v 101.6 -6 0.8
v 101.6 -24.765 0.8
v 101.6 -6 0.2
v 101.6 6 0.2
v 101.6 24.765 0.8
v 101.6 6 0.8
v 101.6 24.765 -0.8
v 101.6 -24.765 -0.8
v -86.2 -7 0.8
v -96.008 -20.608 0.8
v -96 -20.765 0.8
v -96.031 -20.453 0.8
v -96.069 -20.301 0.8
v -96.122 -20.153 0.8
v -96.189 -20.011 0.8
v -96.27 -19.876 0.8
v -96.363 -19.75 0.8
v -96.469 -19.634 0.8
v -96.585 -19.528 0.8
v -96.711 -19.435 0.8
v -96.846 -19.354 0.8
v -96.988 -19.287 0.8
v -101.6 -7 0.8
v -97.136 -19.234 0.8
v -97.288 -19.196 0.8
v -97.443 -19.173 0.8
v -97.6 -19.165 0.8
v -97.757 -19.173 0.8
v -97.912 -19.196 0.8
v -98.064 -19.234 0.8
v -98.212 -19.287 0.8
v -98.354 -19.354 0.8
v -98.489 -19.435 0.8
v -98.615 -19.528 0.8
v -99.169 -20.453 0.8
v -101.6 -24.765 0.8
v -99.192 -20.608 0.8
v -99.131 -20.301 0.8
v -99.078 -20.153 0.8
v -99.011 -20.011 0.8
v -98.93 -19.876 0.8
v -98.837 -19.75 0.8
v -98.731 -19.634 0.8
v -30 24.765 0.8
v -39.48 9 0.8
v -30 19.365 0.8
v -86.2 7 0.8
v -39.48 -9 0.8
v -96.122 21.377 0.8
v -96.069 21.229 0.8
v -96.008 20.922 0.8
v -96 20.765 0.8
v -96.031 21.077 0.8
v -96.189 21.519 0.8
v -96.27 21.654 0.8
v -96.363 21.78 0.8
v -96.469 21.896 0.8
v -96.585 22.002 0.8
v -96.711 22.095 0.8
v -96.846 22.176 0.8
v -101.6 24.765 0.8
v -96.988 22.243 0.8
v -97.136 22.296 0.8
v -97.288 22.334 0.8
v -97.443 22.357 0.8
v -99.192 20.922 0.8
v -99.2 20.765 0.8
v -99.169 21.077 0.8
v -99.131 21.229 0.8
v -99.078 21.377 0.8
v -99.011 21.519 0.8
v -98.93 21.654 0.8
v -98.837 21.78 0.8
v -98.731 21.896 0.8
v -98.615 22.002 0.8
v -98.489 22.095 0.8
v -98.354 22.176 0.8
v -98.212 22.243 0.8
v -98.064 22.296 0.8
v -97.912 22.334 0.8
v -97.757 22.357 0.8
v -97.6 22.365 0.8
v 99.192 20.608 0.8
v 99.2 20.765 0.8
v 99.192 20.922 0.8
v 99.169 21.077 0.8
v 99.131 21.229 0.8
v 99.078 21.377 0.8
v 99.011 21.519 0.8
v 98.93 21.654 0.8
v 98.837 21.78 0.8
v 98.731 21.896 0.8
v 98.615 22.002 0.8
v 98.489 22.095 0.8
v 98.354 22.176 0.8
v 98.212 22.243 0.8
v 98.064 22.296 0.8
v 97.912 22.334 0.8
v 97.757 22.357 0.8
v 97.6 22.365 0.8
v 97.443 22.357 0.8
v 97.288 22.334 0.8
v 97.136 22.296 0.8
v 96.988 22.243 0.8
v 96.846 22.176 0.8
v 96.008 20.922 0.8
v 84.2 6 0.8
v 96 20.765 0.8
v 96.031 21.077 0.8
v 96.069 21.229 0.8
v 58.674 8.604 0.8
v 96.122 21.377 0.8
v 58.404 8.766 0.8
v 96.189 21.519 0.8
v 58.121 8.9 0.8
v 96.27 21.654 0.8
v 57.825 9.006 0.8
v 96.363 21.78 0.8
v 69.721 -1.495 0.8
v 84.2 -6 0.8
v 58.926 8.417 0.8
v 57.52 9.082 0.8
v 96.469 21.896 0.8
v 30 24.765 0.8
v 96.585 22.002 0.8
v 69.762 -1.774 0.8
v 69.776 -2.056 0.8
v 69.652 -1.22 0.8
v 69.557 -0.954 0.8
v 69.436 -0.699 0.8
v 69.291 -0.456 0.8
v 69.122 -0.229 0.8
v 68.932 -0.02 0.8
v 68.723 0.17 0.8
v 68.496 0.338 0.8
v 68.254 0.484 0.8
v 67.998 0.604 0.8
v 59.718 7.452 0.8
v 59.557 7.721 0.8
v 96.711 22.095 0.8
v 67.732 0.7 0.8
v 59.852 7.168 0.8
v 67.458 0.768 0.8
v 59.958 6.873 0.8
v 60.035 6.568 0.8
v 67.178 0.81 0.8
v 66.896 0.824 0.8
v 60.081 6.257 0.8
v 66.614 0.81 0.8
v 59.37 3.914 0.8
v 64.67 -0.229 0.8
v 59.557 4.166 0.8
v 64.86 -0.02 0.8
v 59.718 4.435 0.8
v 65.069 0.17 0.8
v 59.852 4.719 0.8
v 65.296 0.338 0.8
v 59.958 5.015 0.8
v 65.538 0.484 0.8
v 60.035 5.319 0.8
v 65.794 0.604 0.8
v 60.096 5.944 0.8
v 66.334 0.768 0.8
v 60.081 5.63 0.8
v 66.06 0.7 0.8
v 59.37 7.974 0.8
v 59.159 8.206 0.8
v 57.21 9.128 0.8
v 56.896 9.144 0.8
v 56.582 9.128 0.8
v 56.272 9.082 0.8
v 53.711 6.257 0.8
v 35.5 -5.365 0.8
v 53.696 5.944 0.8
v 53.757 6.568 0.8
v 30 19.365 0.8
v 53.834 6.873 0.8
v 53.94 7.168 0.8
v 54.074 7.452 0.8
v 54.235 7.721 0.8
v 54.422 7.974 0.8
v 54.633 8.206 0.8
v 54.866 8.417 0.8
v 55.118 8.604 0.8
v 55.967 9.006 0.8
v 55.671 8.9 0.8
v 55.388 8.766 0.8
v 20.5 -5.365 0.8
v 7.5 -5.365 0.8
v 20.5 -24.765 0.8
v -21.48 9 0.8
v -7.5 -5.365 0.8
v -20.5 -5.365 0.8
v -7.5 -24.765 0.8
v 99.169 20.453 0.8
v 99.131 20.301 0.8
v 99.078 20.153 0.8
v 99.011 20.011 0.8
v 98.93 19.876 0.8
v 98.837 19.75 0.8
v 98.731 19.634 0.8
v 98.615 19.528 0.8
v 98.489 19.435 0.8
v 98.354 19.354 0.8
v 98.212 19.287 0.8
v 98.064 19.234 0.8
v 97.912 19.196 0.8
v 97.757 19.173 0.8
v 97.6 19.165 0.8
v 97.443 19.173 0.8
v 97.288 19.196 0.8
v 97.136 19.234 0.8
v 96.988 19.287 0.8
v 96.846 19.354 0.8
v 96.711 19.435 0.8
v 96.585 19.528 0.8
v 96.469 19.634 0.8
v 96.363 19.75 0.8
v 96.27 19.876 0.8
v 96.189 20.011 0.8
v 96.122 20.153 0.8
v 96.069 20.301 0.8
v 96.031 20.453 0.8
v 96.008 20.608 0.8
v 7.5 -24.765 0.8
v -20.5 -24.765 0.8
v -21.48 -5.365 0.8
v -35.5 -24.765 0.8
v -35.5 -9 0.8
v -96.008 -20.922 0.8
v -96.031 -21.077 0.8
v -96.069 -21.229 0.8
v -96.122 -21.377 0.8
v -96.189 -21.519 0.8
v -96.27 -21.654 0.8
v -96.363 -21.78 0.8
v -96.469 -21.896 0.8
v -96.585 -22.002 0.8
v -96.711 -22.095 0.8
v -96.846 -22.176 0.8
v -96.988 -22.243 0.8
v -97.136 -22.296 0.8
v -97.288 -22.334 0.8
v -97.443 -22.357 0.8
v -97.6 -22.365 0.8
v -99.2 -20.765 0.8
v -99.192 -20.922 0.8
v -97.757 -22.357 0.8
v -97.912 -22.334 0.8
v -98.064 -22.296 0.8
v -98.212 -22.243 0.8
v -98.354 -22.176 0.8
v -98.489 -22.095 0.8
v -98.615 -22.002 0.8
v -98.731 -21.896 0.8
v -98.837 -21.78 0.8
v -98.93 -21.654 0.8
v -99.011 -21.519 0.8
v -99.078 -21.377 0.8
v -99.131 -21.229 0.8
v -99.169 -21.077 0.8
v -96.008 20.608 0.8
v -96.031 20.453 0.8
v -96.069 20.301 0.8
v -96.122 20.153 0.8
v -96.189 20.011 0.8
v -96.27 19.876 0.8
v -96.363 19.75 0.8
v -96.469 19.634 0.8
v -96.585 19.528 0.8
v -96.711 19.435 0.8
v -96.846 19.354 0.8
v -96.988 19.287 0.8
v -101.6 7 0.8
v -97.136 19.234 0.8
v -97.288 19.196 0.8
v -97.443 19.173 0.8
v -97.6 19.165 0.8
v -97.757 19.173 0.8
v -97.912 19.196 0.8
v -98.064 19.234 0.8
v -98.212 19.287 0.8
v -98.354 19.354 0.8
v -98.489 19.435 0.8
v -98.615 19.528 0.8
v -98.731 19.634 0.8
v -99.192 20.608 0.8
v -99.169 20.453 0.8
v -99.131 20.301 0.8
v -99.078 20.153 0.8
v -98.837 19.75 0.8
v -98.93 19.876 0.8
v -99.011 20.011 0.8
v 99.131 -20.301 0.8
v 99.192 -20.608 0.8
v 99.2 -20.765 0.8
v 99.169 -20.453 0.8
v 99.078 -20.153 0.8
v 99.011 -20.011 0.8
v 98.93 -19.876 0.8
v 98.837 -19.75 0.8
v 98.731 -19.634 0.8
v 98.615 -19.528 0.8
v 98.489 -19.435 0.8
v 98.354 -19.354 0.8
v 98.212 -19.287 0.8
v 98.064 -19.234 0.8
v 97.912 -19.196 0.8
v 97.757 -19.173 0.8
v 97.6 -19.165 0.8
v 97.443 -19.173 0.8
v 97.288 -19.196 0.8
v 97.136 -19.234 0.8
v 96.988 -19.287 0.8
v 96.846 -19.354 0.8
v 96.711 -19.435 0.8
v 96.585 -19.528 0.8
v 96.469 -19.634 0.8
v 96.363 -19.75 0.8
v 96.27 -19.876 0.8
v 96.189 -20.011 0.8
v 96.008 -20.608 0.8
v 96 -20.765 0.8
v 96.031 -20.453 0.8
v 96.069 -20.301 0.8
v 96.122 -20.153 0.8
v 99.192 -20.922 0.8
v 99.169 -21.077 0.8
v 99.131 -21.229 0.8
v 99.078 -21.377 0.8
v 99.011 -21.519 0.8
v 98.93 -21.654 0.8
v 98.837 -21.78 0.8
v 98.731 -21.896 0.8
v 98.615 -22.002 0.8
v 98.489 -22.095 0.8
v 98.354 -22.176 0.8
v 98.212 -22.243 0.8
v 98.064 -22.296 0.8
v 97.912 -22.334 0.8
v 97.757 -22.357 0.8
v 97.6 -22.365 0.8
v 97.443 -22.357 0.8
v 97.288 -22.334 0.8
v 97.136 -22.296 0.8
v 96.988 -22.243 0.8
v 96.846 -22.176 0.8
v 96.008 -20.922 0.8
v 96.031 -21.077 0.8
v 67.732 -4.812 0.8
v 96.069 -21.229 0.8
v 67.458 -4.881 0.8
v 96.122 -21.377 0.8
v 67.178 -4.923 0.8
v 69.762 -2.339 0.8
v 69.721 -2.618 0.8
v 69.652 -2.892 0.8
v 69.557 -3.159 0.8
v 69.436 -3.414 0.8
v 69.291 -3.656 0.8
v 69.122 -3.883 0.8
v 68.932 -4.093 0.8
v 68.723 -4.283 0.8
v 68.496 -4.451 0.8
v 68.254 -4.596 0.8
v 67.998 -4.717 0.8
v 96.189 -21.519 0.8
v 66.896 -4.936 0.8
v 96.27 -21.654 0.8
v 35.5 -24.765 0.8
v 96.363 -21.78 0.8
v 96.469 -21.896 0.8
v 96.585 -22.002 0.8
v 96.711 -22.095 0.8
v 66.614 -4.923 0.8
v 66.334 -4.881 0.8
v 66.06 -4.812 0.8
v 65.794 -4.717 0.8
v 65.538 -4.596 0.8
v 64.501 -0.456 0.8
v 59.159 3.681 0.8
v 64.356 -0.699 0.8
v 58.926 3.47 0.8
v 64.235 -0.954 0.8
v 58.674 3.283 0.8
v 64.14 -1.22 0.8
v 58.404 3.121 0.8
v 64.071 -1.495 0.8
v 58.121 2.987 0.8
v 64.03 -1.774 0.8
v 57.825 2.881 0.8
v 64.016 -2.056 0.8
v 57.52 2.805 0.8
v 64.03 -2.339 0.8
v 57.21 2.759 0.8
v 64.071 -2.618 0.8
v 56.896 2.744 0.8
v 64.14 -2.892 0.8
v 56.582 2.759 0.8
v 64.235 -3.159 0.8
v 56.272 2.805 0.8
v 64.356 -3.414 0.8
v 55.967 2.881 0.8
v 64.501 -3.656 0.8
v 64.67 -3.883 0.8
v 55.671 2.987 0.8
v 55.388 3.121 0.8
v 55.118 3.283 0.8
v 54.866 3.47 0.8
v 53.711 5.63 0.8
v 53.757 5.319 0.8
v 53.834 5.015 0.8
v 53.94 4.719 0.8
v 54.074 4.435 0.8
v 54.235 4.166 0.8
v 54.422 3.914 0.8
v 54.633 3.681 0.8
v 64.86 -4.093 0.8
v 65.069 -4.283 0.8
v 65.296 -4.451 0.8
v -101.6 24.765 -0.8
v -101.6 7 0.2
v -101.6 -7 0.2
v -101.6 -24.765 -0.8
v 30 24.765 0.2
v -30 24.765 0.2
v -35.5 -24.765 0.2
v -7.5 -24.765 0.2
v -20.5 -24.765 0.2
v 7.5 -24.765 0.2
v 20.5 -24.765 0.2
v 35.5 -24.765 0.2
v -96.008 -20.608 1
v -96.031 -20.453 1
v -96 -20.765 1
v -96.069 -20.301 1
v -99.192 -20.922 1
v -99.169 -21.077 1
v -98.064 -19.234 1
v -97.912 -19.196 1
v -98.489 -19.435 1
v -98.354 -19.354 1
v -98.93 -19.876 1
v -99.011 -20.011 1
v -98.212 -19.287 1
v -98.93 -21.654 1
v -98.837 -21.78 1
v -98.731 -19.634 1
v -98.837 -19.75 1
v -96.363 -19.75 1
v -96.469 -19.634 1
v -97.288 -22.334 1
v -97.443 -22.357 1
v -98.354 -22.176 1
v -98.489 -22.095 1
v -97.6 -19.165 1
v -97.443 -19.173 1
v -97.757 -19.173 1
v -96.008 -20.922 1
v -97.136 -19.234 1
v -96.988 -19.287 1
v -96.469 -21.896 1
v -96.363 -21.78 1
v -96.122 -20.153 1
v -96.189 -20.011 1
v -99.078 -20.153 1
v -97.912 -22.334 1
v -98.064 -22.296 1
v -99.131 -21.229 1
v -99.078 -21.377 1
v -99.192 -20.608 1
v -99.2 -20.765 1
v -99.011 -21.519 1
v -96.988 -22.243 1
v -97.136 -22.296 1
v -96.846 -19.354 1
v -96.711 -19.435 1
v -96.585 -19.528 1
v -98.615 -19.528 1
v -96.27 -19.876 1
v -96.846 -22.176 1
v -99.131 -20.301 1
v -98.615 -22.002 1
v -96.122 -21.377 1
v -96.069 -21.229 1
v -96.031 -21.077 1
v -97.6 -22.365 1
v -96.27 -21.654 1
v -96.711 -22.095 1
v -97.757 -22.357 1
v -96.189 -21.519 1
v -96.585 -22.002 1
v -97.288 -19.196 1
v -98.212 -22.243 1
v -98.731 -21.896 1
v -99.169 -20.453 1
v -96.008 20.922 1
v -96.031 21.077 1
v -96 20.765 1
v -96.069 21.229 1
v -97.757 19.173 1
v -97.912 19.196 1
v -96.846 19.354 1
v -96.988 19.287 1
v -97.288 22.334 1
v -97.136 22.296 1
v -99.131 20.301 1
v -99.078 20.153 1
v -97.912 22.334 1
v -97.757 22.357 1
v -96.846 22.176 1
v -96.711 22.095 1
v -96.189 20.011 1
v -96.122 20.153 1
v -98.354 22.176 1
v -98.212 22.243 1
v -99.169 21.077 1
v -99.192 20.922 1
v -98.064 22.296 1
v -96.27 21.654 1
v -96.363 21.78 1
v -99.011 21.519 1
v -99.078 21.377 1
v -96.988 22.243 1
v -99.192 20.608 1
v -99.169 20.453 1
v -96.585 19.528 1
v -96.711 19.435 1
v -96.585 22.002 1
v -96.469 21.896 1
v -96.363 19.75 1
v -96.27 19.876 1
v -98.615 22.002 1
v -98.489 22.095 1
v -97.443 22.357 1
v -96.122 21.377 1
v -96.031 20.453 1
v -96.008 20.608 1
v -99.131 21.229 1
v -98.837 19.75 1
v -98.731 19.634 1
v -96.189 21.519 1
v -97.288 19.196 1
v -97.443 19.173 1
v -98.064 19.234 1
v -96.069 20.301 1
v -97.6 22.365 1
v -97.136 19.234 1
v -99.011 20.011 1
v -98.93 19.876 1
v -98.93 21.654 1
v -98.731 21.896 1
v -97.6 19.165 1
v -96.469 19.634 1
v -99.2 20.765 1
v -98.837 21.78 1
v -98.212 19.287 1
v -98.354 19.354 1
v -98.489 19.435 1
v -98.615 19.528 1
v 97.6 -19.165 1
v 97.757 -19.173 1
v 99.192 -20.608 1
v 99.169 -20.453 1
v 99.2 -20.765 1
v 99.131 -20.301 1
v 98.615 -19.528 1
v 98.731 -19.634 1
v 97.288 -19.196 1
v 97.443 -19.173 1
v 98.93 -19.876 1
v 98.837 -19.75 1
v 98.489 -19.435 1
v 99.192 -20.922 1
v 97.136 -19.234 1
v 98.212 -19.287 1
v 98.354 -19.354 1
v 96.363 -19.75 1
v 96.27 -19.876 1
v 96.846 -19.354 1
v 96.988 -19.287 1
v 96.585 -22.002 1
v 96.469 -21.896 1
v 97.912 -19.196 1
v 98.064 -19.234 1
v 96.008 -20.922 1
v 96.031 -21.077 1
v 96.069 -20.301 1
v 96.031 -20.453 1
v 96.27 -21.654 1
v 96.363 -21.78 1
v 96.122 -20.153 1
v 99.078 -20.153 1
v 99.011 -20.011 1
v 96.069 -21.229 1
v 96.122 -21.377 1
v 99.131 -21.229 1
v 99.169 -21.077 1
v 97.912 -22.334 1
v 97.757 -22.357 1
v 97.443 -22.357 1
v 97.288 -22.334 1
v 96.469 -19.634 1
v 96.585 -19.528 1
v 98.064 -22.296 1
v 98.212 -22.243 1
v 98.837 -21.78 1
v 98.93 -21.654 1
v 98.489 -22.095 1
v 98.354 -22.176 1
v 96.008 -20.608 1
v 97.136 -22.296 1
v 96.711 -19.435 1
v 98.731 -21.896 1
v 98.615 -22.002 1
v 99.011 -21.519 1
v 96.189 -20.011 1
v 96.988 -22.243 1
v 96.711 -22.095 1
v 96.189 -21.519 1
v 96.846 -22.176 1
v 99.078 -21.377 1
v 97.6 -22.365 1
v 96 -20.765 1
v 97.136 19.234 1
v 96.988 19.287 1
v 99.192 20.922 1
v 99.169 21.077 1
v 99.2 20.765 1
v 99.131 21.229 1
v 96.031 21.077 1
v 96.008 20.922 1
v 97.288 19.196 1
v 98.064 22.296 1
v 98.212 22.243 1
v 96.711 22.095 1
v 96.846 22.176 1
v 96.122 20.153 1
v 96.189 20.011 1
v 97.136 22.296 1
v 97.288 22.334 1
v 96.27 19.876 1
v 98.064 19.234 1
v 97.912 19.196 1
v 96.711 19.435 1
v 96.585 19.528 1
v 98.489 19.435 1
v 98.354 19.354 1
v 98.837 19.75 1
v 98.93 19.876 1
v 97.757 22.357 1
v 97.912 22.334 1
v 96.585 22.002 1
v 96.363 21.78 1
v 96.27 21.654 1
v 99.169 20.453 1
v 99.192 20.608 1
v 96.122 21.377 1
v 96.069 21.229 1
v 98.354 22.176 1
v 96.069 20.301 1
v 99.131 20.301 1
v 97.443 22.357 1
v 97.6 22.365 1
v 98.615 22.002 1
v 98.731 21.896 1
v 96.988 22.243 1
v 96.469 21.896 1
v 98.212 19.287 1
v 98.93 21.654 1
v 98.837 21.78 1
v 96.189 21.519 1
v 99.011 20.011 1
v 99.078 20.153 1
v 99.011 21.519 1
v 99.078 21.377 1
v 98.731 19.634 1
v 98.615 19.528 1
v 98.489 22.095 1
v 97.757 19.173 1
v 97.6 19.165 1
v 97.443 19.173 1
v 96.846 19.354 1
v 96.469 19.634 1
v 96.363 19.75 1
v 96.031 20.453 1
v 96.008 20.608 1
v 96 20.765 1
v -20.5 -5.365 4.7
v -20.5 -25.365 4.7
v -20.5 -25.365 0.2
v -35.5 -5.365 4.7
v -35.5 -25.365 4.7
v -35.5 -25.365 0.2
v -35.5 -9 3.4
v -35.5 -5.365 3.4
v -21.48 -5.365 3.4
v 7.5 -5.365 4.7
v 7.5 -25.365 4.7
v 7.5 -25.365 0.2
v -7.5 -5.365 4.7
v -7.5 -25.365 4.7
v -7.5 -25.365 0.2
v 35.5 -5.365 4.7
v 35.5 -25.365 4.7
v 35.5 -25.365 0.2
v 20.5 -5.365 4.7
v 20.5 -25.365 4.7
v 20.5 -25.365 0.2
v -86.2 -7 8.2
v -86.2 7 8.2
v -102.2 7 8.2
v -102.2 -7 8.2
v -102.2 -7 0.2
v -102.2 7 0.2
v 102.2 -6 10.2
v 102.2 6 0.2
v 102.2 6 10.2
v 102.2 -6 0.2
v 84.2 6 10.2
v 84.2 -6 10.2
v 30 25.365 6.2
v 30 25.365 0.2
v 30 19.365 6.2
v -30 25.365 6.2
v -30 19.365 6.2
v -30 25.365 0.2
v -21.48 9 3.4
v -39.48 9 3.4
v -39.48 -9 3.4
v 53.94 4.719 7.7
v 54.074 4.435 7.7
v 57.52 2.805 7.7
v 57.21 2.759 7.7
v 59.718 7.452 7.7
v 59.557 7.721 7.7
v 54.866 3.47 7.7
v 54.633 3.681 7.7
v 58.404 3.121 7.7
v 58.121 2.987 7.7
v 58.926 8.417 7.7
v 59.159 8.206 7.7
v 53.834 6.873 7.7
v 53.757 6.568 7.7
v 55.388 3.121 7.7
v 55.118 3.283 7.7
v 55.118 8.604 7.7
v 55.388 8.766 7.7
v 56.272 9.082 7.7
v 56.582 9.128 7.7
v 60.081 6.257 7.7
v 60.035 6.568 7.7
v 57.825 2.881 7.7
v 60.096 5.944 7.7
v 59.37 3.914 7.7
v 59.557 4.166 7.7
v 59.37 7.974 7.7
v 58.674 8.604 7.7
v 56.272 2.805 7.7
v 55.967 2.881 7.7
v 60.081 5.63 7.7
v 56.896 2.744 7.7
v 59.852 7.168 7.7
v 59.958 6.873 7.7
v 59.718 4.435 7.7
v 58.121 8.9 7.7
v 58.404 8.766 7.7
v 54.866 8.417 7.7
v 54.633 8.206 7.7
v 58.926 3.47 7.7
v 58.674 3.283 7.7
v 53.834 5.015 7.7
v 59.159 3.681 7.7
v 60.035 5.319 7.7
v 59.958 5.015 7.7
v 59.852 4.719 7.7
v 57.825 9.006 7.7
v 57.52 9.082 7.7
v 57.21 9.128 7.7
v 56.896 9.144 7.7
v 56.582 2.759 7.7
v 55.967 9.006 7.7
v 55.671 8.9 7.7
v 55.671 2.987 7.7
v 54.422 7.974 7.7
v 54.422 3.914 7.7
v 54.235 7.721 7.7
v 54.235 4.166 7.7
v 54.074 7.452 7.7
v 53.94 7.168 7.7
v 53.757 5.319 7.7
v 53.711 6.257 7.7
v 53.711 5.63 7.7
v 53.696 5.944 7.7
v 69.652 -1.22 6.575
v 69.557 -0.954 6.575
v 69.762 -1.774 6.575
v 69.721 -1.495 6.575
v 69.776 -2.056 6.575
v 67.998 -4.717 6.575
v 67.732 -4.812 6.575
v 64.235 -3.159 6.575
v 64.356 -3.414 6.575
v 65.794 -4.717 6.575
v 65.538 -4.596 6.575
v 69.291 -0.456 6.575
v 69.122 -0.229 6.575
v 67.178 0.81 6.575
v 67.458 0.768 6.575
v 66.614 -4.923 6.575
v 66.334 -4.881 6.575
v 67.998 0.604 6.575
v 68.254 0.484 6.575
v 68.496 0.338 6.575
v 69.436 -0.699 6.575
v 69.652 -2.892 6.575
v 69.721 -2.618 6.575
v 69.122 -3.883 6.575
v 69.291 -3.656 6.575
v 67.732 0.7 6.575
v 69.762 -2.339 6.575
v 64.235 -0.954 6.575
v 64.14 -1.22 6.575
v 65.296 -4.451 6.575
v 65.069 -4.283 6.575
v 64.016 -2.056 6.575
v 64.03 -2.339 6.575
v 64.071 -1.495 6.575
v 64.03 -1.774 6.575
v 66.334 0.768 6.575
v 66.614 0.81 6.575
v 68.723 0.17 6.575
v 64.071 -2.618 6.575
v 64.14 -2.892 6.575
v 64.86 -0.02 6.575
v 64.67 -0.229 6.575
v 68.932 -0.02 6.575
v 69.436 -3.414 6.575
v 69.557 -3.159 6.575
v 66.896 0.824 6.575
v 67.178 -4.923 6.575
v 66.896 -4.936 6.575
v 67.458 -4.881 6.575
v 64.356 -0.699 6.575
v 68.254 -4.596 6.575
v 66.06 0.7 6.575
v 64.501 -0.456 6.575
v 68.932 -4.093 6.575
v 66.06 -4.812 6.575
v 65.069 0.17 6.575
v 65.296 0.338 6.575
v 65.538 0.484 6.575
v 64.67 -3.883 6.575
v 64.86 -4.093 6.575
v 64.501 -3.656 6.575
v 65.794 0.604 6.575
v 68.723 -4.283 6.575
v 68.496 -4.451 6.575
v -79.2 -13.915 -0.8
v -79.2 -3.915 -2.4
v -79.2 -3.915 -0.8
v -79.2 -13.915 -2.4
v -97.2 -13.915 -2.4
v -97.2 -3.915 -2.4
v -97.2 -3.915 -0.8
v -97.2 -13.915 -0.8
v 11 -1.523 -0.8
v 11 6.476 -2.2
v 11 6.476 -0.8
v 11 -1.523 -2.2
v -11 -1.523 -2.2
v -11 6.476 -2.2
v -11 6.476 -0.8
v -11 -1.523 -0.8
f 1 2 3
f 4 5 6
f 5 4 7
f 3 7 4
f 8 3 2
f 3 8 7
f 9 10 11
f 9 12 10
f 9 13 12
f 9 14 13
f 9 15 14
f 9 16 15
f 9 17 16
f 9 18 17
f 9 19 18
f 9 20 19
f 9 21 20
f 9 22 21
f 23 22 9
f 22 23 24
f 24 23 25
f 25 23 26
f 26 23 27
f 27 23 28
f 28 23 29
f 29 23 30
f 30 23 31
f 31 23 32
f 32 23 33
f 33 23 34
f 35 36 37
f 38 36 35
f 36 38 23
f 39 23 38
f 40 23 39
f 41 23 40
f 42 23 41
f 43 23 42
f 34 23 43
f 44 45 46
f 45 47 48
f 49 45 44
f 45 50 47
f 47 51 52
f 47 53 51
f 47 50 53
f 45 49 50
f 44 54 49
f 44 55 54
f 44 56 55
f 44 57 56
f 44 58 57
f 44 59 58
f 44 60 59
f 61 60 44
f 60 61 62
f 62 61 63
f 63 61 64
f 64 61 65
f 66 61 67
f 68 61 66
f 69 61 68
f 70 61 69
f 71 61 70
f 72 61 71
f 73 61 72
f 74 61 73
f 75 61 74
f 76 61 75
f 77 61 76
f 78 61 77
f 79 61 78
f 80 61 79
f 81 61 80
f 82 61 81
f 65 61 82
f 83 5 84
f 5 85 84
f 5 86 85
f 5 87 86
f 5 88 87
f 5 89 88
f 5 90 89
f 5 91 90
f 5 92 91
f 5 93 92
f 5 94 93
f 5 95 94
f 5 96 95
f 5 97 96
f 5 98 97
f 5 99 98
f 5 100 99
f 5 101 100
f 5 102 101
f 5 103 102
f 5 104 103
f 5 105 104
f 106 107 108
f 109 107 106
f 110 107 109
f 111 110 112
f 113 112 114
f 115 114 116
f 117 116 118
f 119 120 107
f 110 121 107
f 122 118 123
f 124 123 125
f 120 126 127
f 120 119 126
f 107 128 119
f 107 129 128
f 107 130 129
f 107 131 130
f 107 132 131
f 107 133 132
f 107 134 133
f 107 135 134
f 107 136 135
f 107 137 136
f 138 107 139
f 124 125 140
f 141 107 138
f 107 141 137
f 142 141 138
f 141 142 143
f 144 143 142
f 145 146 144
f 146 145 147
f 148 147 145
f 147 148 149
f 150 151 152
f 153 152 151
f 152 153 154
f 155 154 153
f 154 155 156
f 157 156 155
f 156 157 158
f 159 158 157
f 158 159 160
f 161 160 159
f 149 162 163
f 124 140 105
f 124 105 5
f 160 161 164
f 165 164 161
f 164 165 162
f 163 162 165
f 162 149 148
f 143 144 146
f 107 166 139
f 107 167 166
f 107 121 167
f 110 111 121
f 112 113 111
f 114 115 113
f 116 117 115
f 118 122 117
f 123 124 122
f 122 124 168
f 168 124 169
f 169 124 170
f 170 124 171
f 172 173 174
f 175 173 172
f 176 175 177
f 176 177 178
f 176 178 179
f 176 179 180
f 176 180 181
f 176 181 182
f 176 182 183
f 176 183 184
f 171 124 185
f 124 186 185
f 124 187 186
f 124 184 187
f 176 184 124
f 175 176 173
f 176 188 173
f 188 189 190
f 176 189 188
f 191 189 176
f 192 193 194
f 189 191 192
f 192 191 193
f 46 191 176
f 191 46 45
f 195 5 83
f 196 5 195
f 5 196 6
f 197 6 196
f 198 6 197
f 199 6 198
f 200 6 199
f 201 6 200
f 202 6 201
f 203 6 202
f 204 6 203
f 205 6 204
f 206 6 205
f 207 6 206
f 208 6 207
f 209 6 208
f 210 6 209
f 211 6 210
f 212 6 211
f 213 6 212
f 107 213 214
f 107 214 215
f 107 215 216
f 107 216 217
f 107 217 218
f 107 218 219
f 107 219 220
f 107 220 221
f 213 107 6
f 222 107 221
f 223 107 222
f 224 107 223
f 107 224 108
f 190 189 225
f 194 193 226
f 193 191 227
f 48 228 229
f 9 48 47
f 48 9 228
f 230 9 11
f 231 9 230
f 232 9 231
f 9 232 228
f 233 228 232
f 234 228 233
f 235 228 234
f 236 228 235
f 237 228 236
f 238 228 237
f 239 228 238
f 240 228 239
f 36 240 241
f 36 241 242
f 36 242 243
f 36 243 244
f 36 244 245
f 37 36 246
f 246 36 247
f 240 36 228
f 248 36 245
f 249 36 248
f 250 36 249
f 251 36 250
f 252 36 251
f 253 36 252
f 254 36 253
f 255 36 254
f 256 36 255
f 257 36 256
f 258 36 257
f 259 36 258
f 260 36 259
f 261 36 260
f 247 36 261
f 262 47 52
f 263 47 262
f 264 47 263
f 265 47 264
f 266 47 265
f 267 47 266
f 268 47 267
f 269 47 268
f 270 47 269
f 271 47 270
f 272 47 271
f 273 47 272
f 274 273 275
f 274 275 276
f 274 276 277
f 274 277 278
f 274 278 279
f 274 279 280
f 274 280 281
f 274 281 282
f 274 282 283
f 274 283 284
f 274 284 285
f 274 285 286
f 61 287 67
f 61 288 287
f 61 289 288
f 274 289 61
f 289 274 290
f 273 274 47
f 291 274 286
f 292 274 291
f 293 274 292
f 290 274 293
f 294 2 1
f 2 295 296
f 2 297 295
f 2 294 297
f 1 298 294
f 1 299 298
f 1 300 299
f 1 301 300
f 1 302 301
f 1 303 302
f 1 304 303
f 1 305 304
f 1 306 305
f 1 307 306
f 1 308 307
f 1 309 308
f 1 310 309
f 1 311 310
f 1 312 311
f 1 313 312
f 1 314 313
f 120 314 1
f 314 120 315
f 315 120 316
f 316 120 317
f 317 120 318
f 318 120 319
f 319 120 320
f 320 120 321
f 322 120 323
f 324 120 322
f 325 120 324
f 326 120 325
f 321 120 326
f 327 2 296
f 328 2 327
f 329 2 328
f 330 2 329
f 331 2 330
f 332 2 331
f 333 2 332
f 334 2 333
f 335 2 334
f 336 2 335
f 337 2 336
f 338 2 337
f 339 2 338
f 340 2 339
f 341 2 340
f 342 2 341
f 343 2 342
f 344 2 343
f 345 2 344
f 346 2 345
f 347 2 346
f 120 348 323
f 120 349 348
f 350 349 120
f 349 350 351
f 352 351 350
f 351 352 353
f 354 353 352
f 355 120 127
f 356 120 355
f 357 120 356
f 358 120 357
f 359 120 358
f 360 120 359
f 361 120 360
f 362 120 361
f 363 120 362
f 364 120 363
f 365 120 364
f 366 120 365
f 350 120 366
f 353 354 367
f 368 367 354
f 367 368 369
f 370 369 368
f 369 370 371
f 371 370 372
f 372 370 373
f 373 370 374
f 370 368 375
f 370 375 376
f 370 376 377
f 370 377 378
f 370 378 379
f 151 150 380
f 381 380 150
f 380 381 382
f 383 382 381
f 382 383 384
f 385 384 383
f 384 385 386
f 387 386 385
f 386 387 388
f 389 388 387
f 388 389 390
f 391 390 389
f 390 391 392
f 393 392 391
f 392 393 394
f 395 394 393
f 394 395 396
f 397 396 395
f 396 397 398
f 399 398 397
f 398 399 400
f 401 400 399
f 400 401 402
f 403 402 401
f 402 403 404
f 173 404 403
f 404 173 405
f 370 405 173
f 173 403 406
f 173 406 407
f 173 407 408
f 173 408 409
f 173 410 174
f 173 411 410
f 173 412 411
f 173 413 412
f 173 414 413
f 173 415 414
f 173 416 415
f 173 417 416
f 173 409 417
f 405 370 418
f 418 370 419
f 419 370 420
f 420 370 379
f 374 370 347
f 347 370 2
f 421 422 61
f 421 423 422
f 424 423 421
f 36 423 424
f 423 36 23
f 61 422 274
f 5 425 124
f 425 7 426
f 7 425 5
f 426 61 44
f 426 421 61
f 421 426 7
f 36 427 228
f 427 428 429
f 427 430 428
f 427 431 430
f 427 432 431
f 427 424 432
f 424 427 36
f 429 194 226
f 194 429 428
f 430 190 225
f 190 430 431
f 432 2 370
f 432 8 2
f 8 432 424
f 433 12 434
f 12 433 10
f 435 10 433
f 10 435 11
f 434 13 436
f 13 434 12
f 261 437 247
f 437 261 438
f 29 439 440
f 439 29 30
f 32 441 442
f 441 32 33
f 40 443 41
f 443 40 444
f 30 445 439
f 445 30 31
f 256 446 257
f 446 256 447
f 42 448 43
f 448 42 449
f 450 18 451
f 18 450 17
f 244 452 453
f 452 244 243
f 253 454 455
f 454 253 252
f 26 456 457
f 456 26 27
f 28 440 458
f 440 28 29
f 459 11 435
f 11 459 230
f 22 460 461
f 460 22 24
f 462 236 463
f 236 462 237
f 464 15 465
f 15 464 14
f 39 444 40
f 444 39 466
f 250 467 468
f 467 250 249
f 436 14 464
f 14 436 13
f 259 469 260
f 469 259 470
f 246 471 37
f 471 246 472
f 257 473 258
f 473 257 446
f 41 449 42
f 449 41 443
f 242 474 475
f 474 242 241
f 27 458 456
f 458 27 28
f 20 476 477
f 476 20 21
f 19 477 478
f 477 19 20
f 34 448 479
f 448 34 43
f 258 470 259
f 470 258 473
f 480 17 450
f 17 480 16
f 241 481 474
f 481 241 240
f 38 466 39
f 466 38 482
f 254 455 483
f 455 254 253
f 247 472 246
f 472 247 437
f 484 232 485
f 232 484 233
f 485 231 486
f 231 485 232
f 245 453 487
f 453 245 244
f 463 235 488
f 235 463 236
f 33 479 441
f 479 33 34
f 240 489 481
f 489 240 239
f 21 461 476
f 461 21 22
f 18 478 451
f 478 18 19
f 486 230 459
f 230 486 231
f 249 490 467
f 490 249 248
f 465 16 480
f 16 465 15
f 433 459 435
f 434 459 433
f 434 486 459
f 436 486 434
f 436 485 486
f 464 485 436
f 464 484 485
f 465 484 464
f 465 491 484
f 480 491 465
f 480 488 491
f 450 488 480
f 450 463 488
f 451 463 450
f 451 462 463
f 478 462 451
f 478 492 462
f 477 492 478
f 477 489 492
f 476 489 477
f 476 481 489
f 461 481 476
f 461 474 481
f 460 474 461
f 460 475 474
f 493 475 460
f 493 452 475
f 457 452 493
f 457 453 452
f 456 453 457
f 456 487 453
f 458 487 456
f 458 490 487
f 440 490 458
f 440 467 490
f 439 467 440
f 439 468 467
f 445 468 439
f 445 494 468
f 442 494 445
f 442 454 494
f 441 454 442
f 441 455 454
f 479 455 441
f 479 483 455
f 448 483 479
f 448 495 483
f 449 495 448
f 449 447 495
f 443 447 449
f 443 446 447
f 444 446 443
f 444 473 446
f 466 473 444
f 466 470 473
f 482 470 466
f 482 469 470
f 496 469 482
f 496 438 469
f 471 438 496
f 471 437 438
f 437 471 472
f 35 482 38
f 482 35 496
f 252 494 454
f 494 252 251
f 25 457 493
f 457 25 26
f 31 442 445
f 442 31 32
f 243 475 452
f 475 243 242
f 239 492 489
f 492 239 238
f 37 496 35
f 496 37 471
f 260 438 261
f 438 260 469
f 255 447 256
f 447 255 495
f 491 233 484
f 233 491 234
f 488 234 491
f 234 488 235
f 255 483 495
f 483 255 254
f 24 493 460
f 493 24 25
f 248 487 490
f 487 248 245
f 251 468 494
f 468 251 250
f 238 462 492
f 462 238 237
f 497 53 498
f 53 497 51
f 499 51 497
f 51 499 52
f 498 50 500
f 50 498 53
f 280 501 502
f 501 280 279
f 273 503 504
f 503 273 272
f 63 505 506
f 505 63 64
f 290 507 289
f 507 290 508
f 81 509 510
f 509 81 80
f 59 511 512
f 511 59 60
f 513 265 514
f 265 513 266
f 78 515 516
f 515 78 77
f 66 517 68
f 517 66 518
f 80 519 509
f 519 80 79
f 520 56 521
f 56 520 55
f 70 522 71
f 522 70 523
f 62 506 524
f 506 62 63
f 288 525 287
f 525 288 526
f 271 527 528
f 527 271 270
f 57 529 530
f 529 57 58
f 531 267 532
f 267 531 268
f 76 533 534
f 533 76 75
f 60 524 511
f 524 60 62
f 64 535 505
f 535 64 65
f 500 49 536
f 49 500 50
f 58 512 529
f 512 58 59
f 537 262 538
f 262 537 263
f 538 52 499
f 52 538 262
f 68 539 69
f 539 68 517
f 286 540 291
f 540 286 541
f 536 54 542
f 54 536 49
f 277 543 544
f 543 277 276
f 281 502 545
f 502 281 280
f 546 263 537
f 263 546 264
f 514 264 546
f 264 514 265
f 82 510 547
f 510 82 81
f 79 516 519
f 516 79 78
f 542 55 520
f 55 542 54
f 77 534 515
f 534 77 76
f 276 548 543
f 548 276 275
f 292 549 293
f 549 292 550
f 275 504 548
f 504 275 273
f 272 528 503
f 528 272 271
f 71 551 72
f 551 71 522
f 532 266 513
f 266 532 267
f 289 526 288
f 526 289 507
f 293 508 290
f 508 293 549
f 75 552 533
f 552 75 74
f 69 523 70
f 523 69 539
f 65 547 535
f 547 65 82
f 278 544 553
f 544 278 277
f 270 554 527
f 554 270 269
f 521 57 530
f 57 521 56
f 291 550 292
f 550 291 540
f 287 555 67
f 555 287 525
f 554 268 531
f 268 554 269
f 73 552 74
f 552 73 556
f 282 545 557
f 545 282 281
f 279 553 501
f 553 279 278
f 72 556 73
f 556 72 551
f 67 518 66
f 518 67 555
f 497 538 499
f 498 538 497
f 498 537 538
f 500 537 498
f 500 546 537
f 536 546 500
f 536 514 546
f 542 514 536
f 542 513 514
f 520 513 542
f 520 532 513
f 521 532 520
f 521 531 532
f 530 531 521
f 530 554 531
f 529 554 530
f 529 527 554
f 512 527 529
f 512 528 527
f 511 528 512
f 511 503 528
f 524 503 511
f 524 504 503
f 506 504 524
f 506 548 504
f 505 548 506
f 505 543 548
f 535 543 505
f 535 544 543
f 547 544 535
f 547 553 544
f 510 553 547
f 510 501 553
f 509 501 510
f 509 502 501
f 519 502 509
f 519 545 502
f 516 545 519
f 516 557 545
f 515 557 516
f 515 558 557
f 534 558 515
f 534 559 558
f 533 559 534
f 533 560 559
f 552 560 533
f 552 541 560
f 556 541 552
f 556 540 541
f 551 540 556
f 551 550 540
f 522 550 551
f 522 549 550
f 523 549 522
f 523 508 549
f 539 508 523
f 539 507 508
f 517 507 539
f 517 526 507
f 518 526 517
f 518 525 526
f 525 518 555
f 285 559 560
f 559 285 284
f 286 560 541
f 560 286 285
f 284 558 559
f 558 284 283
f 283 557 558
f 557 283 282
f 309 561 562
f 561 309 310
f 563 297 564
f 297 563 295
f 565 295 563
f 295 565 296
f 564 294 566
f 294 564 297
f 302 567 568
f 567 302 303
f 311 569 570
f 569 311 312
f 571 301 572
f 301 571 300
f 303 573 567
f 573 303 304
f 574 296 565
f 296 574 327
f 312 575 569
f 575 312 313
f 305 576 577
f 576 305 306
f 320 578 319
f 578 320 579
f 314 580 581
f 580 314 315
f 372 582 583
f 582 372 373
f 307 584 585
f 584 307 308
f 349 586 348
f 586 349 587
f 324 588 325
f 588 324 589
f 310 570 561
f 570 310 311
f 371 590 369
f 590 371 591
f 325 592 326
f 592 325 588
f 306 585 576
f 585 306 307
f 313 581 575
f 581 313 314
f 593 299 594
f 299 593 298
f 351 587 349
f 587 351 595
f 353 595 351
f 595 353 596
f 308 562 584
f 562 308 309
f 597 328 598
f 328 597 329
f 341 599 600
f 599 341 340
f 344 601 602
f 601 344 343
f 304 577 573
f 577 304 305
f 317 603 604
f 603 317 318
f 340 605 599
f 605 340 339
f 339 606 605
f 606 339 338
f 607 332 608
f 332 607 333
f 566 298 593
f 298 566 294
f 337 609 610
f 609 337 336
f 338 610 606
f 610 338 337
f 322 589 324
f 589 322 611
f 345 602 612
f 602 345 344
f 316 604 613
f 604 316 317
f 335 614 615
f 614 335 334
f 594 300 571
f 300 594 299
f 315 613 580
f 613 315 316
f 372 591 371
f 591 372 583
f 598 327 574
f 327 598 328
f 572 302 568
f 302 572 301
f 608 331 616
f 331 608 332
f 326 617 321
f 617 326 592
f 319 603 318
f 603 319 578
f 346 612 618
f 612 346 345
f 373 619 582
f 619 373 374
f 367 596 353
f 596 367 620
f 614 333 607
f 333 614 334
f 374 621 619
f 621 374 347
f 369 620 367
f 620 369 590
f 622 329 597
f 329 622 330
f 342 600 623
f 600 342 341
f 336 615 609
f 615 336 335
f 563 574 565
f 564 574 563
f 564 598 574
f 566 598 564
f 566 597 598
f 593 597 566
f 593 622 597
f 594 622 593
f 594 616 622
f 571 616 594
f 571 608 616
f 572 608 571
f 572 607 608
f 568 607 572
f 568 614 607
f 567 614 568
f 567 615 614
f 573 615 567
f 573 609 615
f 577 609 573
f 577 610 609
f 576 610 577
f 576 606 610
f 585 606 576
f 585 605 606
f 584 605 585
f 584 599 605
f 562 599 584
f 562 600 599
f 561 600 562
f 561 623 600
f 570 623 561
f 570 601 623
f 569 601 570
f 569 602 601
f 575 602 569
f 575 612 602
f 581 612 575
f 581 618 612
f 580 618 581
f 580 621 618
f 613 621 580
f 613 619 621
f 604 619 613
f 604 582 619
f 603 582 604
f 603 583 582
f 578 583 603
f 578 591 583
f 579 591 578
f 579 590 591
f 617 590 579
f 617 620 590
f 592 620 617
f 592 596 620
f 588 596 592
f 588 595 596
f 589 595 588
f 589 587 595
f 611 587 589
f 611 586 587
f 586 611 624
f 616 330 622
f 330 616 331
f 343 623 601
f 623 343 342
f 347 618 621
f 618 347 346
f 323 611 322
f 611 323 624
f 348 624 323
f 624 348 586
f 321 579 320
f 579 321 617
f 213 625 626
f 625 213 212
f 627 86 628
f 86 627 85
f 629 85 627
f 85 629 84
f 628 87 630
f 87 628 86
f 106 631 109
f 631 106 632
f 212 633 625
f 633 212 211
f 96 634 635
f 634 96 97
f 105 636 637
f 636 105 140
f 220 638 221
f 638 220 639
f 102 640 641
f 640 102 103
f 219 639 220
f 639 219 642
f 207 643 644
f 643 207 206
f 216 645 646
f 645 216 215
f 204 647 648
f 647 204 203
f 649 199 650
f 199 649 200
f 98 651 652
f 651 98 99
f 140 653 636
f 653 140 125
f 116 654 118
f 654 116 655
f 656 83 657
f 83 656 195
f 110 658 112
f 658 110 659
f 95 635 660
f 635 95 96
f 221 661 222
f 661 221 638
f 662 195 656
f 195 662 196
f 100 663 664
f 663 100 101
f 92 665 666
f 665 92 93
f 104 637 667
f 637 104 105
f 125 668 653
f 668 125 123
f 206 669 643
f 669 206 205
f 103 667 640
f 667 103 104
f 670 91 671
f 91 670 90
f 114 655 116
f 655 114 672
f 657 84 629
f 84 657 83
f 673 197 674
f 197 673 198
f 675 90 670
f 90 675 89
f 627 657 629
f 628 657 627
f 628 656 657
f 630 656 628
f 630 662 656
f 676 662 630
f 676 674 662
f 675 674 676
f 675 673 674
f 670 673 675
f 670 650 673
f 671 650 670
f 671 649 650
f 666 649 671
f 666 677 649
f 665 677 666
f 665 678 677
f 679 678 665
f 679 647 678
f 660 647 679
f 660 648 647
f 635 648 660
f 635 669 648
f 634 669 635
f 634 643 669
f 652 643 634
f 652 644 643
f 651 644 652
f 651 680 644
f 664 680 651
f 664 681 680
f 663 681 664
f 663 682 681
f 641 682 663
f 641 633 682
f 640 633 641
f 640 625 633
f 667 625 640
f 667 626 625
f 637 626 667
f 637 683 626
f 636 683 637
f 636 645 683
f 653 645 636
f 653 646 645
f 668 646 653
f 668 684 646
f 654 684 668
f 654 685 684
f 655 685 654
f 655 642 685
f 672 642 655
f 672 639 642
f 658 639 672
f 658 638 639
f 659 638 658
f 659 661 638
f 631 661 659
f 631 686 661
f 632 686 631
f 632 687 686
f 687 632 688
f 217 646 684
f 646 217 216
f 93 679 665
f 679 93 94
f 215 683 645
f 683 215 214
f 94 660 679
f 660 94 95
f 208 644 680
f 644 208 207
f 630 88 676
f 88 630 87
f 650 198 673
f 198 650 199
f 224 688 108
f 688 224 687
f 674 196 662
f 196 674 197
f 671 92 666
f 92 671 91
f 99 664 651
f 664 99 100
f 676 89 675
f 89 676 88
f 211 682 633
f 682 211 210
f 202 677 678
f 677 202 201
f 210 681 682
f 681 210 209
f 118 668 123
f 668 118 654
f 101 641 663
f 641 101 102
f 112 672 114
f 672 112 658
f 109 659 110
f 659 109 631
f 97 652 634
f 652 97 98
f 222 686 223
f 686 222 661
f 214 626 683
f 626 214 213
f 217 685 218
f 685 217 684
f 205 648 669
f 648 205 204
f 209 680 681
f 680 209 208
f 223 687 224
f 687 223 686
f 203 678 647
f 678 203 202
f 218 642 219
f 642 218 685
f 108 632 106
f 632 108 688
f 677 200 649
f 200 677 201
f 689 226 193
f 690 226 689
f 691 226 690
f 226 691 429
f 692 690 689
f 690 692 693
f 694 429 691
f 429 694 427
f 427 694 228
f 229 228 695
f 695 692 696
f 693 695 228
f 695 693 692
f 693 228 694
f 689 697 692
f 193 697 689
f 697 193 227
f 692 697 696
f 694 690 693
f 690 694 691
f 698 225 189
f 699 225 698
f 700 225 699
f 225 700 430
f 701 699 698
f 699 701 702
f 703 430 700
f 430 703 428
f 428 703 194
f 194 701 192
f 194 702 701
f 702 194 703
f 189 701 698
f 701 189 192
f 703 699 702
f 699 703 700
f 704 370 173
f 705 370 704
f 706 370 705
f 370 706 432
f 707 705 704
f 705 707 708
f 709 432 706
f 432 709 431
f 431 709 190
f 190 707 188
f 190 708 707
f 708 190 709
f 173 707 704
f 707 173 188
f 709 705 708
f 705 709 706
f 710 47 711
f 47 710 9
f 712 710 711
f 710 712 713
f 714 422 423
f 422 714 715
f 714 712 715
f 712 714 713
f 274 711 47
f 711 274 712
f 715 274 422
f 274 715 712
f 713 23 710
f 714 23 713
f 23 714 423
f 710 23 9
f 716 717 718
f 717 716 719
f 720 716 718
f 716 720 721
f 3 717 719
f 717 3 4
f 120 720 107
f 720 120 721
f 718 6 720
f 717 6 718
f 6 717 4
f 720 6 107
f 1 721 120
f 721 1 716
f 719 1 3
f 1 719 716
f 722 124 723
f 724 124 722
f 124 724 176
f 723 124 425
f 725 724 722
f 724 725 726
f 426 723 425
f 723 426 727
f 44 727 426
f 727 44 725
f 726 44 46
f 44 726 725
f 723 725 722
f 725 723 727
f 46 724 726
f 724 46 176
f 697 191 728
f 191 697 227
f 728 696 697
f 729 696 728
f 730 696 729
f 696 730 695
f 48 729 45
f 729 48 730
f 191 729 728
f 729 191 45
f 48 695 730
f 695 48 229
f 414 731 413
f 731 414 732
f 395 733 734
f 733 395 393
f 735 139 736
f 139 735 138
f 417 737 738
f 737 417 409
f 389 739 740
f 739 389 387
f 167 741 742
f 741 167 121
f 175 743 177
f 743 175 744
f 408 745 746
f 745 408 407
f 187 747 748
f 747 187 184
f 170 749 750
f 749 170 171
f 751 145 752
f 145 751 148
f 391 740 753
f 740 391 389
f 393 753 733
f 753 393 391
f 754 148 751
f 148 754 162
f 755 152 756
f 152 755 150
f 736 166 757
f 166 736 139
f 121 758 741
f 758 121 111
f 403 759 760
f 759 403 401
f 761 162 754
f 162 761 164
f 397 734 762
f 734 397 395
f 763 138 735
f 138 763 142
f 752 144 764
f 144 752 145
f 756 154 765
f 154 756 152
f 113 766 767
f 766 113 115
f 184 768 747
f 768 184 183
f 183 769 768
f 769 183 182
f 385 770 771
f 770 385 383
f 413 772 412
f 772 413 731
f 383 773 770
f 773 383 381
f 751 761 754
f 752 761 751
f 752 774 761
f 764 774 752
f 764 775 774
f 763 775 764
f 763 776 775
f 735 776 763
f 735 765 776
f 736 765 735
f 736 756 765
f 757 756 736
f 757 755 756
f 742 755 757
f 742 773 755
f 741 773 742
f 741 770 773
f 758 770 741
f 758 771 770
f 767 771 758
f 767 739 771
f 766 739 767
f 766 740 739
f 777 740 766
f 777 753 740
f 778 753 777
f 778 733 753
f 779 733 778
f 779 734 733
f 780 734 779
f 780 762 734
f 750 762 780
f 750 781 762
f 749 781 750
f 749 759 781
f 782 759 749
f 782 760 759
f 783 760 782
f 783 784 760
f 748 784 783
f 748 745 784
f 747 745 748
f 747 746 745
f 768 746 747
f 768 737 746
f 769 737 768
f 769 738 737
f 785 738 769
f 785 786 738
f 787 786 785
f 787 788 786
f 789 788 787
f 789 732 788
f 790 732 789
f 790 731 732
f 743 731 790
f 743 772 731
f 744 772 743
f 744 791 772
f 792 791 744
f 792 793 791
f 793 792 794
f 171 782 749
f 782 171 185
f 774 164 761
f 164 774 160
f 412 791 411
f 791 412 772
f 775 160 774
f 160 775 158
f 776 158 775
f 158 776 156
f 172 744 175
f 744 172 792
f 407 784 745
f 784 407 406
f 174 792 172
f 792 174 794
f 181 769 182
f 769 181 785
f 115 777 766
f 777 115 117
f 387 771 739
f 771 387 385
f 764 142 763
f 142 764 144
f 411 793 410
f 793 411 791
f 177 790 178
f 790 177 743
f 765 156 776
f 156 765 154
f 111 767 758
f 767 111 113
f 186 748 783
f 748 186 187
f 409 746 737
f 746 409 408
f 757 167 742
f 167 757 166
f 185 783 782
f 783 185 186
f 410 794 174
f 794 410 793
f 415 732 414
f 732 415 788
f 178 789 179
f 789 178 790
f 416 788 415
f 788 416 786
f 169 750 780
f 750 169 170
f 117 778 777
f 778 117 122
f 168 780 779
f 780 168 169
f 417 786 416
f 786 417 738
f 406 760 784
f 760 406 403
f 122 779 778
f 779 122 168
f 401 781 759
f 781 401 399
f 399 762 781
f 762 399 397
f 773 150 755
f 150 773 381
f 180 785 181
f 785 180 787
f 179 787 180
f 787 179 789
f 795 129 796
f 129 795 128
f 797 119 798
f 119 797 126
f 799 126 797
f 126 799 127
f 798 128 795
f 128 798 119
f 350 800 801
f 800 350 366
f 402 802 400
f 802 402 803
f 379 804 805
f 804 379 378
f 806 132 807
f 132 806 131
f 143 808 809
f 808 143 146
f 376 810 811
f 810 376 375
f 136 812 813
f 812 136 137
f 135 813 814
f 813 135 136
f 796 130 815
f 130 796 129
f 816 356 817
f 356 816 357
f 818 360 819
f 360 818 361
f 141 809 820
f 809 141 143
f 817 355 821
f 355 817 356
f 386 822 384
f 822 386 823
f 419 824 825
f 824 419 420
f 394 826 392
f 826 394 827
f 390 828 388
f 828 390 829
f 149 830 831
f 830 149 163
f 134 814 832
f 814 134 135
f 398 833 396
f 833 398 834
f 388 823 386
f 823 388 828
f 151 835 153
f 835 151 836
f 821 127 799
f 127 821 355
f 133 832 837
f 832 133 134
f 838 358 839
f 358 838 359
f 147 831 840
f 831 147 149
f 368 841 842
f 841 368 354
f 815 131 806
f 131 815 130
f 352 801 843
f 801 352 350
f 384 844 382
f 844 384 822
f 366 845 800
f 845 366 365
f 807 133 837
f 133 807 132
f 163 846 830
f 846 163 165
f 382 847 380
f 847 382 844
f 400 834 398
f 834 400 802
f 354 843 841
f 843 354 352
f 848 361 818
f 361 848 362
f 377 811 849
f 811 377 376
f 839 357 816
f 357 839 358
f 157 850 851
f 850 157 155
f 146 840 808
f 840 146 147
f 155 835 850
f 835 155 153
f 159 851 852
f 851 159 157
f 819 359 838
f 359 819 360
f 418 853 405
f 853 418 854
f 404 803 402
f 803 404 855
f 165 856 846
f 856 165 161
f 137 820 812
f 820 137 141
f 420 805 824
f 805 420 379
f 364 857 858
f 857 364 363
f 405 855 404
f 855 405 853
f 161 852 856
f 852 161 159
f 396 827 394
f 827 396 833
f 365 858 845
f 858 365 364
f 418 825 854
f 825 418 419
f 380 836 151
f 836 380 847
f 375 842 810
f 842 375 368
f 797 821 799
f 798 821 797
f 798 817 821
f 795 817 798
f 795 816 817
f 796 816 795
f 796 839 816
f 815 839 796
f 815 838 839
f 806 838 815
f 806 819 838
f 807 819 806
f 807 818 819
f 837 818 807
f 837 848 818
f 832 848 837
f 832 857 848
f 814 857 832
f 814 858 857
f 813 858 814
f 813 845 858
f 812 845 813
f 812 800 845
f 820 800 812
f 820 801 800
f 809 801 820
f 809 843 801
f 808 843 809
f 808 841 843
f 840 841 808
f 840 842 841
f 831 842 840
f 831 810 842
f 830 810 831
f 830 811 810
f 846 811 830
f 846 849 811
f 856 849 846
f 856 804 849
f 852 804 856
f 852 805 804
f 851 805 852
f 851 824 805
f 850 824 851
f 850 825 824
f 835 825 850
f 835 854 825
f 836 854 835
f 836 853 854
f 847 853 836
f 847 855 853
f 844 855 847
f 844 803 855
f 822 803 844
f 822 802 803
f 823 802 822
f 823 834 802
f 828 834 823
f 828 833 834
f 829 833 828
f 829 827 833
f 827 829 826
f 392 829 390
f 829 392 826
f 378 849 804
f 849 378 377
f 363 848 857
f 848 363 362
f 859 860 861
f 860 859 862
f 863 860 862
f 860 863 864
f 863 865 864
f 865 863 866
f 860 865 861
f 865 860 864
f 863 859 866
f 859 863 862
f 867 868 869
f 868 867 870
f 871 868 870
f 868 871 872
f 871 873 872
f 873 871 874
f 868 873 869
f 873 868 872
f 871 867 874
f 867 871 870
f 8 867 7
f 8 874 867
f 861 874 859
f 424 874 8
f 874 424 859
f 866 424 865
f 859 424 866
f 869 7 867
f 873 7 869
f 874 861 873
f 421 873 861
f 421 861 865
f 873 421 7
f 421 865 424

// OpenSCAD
$fn = 64;

// Target board dimensions (mm)
pcb_length = 203.2;
pcb_width  = 49.53;
pcb_thickness = 1.6;

// Connectivity / robustness
overlap = 0.6;          // intentional interpenetration to guarantee one connected solid
eps = 0.01;

// Mounting holes (visual only; NOT subtracted to keep one solid)
hole_radius = 1.6;      // slightly larger so they read in renders
hole_rim_h  = 0.8;      // small boss height above PCB

// Feature sizes (approximate control-board look)
edge_rail_w = 2.2;      // raised rail along long edges
edge_rail_h = 0.6;

usb_len = 16;
usb_w   = 14;
usb_h   = 8;

power_len = 18;
power_w   = 12;
power_h   = 10;

header_len = 60;
header_w   = 6;
header_h   = 6;

chip_len = 18;
chip_w   = 18;
chip_h   = 3.2;

cap_r = 3.2;
cap_h = 7.5;

driver_len = 15;
driver_w   = 20;
driver_h   = 4.5;

silk_th = 0.25;
silk_margin = 3.0;

// Helpers
module add_on_top(size, pos_xy) {
    // Places a centered cube on top of PCB with guaranteed overlap
    translate([pos_xy[0], pos_xy[1], pcb_thickness/2 + size[2]/2 - overlap])
        cube(size, center=true);
}

module add_on_bottom(size, pos_xy) {
    // Places a centered cube on bottom of PCB with guaranteed overlap
    translate([pos_xy[0], pos_xy[1], -pcb_thickness/2 - size[2]/2 + overlap])
        cube(size, center=true);
}

module add_cyl_on_top(r, h, pos_xy) {
    translate([pos_xy[0], pos_xy[1], pcb_thickness/2 + h/2 - overlap])
        cylinder(r=r, h=h, center=true);
}

// Main PCB slab
module pcb_body() {
    color([0.0, 0.4, 0.2])
        cube([pcb_length, pcb_width, pcb_thickness], center=true);
}

// Raised edge rails (gives board some recognizable detail)
module edge_rails() {
    // Along long edges (Y = +/-)
    rail_len = pcb_length;
    rail_w = edge_rail_w;
    rail_h = edge_rail_h;

    translate([0,  pcb_width/2 - rail_w/2, pcb_thickness/2 + rail_h/2 - overlap])
        cube([rail_len, rail_w, rail_h], center=true);

    translate([0, -pcb_width/2 + rail_w/2, pcb_thickness/2 + rail_h/2 - overlap])
        cube([rail_len, rail_w, rail_h], center=true);
}

// Silkscreen plate (thin raised area)
module silkscreen() {
    sx = pcb_length - 2*silk_margin;
    sy = pcb_width  - 2*silk_margin;
    translate([0, 0, pcb_thickness/2 + silk_th/2 - overlap])
        cube([sx, sy, silk_th], center=true);
}

// Mounting hole rims (visual bosses; keep solid)
module mounting_hole_rims() {
    // Keep inside board outline
    inset = 4.0;
    x = pcb_length/2 - inset;
    y = pcb_width/2  - inset;

    for (sx = [-1, 1], sy = [-1, 1])
        add_cyl_on_top(hole_radius, hole_rim_h, [sx*x, sy*y]);
}

// Connectors and components (all connected via overlap into PCB)
module connectors_and_components() {
    // USB-like connector on left edge
    usb_x = -pcb_length/2 + usb_len/2 - overlap;
    add_on_top([usb_len, usb_w, usb_h], [usb_x, 0]);

    // Power terminal on right edge
    pwr_x = pcb_length/2 - power_len/2 + overlap;
    add_on_top([power_len, power_w, power_h], [pwr_x, 0]);

    // Long pin header along top edge (near +Y)
    hdr_y = pcb_width/2 - header_w/2 + overlap;
    add_on_top([header_len, header_w, header_h], [0, hdr_y]);

    // Main MCU chip near center-left
    chip_x = -pcb_length*0.15;
    add_on_top([chip_len, chip_w, chip_h], [chip_x, 0]);

    // Stepper driver modules (3 blocks) near bottom edge (-Y)
    drv_y = -pcb_width/2 + driver_w/2 - overlap;
    drv_spacing = 28;
    for (i = [-1, 0, 1]) {
        add_on_top([driver_len, driver_w, driver_h], [i*drv_spacing, drv_y]);
    }

    // Capacitors (cylinders) near power side
    cap_x0 = pcb_length*0.28;
    cap_y0 = pcb_width*0.12;
    add_cyl_on_top(cap_r, cap_h, [cap_x0, cap_y0]);
    add_cyl_on_top(cap_r*0.9, cap_h*0.85, [cap_x0 + 10, cap_y0 - 8]);

    // A couple of underside features (solder blob / connector backs) to show bottom detail
    add_on_bottom([18, 10, 2.2], [usb_x + 6, -pcb_width*0.18]);
    add_on_bottom([22, 8, 2.0], [0, pcb_width*0.05]);
}

// Final: ONE connected solid (no subtractions)
union() {
    pcb_body();
    edge_rails();
    silkscreen();
    mounting_hole_rims();
    connectors_and_components();
}
